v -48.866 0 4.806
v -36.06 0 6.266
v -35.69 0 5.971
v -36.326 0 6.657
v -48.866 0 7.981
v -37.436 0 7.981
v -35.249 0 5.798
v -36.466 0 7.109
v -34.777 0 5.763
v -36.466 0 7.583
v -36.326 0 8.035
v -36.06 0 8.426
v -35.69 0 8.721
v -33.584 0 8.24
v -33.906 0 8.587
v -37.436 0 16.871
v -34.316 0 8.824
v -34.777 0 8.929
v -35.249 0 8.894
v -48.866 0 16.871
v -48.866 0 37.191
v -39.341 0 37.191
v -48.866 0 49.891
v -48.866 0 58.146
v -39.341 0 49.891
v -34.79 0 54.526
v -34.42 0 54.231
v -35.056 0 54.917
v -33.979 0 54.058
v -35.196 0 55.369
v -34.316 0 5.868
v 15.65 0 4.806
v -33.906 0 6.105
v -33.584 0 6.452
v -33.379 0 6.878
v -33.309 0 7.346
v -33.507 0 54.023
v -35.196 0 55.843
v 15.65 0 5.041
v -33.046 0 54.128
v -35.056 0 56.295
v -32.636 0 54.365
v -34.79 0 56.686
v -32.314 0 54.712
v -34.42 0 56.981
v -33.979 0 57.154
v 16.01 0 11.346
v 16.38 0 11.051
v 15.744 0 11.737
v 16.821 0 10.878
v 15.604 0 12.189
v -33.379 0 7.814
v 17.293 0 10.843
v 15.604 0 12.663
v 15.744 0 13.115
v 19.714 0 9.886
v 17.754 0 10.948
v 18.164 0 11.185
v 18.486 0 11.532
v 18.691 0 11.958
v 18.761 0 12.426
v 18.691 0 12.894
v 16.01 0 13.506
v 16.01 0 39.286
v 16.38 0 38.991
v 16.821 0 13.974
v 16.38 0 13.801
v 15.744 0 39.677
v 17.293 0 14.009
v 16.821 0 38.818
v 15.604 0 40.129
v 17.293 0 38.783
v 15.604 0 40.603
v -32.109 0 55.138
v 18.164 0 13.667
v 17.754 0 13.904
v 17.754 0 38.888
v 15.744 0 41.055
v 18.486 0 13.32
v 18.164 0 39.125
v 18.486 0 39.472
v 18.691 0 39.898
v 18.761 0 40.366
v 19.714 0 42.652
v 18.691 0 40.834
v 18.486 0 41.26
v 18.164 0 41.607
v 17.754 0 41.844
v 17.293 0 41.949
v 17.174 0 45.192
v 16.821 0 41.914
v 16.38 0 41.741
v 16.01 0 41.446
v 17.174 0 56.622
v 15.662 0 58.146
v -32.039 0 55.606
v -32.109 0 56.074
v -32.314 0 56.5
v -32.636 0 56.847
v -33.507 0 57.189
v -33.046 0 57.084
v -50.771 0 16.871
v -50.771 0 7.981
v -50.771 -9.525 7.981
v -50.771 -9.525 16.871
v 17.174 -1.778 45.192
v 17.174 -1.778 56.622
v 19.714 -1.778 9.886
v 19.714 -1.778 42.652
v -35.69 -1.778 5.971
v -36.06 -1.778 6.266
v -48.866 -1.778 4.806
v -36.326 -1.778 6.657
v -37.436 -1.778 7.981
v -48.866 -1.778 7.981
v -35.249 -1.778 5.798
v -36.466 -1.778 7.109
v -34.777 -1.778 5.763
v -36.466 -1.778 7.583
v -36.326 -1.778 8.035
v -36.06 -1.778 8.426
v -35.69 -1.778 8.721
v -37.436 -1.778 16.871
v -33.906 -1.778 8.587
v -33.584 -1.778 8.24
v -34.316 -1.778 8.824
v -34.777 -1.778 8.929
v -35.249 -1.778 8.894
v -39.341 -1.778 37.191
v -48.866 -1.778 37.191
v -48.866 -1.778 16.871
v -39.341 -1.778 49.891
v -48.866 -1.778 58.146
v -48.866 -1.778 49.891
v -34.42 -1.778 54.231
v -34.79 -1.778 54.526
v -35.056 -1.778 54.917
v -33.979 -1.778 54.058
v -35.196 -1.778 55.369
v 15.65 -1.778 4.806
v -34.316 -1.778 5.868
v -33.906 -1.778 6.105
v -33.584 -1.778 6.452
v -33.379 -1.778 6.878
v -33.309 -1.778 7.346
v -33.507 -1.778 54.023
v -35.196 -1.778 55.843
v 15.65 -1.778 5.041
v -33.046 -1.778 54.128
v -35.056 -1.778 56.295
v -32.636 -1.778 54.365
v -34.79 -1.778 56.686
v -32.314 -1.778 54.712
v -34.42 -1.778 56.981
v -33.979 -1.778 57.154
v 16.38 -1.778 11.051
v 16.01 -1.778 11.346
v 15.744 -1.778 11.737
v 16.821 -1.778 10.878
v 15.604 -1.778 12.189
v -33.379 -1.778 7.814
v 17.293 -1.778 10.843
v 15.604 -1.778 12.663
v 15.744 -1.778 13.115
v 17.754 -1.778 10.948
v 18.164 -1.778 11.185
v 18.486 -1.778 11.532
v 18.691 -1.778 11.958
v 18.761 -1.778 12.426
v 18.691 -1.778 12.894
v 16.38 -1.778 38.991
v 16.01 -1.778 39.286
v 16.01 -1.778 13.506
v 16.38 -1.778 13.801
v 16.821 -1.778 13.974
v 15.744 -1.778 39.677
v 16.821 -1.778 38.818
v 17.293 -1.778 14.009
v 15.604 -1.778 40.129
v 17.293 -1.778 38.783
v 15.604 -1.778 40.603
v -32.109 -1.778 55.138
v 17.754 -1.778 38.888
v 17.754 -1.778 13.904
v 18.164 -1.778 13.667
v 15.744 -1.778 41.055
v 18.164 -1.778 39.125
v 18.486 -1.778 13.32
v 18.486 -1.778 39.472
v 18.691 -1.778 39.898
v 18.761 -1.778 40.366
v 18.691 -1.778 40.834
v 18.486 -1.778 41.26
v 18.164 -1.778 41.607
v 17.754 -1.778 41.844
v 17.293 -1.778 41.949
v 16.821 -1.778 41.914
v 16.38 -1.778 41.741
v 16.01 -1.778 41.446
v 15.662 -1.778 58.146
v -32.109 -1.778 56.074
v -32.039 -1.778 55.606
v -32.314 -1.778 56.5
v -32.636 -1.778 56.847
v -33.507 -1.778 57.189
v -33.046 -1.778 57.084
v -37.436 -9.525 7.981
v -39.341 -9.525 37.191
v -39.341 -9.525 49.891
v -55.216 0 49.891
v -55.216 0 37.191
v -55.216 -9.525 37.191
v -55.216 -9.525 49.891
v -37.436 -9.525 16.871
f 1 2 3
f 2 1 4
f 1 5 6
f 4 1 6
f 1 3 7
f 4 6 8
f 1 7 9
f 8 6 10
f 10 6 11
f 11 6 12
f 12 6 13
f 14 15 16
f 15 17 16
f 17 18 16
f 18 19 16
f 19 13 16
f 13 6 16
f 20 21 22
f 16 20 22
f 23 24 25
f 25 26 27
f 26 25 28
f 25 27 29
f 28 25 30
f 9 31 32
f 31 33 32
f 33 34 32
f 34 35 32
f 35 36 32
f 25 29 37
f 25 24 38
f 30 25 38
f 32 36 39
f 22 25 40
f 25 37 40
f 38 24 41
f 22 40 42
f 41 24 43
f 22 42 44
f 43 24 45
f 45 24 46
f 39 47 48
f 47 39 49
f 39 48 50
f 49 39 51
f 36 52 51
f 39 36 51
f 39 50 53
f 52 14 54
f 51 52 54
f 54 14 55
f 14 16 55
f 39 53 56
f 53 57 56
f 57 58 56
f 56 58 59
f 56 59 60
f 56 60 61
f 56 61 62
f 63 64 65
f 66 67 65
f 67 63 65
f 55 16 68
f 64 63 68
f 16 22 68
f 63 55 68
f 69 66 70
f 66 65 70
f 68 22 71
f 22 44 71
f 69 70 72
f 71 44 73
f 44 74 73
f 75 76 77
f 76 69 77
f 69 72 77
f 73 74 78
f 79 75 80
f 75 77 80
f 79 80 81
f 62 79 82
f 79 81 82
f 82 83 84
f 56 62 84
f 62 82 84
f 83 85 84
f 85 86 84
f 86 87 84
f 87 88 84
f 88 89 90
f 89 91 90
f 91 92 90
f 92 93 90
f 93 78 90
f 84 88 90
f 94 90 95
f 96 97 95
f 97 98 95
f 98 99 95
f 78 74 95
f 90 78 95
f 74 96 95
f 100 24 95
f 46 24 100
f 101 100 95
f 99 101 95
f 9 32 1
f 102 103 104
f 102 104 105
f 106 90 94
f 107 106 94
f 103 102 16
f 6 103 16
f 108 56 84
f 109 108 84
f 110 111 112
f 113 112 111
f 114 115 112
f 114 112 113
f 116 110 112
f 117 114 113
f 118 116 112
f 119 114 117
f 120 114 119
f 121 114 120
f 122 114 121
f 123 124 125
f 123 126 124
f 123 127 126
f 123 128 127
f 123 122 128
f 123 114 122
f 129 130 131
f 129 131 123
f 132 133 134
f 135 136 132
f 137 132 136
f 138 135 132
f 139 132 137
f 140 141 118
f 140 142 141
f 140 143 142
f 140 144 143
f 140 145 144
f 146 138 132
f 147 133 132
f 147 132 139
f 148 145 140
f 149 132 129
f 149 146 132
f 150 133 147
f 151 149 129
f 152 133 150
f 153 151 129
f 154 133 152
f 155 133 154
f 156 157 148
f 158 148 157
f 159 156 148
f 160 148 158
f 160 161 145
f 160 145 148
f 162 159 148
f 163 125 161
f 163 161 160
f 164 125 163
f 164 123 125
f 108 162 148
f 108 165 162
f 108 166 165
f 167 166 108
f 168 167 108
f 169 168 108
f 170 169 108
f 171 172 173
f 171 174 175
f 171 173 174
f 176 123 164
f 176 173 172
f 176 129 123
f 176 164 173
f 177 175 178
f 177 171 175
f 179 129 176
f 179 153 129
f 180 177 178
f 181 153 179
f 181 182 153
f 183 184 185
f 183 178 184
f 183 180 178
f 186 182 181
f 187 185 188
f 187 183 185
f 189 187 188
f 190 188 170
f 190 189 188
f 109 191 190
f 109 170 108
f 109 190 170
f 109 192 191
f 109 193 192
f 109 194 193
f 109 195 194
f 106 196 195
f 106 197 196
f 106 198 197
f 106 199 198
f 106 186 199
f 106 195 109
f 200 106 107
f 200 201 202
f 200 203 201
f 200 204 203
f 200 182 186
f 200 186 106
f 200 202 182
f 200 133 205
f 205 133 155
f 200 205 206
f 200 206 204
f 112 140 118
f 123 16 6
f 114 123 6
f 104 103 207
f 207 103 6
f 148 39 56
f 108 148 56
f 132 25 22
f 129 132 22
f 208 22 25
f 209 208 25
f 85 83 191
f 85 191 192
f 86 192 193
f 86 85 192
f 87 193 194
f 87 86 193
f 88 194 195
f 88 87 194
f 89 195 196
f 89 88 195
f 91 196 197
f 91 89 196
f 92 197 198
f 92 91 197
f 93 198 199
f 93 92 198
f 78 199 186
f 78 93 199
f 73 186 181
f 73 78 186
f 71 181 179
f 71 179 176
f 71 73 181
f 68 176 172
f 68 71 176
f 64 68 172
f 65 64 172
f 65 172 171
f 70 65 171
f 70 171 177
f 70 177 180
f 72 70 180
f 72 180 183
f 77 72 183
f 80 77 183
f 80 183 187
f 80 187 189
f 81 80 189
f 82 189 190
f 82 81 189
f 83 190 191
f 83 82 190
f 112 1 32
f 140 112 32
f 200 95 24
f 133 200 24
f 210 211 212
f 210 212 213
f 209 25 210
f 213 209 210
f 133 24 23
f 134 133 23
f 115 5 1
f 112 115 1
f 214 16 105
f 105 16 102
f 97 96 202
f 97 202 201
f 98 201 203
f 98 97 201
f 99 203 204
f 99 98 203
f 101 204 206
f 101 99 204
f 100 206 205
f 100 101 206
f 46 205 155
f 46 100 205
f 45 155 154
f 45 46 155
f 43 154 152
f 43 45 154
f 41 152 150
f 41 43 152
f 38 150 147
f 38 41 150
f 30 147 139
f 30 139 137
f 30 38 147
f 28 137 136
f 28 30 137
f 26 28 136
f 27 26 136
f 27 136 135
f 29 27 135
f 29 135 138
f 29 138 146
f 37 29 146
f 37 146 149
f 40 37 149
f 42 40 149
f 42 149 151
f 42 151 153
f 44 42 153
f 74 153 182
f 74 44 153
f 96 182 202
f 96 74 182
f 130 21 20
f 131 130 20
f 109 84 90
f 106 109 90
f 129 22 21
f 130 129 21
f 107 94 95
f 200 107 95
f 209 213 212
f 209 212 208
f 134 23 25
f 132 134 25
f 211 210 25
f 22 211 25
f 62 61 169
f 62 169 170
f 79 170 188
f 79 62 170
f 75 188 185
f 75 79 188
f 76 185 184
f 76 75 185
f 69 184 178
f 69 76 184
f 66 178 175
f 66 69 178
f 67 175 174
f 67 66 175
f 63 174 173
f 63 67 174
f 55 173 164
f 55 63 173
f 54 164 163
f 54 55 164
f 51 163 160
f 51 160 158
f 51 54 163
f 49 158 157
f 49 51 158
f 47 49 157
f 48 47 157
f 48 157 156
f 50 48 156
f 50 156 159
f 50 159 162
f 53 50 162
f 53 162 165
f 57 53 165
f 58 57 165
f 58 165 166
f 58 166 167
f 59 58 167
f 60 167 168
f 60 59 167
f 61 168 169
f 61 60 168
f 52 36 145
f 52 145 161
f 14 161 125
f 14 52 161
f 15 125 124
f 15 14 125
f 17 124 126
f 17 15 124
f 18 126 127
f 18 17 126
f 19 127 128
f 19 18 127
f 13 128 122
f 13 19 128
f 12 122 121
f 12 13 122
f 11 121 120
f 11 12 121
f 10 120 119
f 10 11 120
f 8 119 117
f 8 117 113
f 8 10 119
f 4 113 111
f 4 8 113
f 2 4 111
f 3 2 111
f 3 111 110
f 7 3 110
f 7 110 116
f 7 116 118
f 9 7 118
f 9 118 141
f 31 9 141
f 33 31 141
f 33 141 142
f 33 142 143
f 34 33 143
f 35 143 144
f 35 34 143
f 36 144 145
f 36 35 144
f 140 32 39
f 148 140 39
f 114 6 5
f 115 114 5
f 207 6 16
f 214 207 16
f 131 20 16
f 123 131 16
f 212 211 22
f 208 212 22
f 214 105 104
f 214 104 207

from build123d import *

# Parameters (mm, degrees)
F0_R     = 1.5875
F1_DEPTH = 1.778
F0_W     = 6.35
F0_H     = 12.7
F0_W_2   = 9.525
F2_DEPTH = 9.525
F0_W_3   = 11.43
F0_H_2   = 8.89
F0_W_4   = 1.905


# Not quite as in the source:
# - ends of sketch curves that miss each other by under 0.0002 mm in the source are joined


with BuildPart() as f1:
    # F0 (on Front) → F1 (new body)
    with BuildSketch(Plane.XZ):
        Polygon((15.6624242663, 58.1459343719), (-48.8660596311, 58.1459343719), (-48.8660596311, 49.8909343719), (-39.3410596311, 49.8909343719), (-39.3410596311, 37.1909343719), (-48.8660596311, 37.1909343719), (-48.8660596311, 16.8709343719), (-37.4360596311, 16.8709343719), (-37.4360596311, 7.9809343719), (-48.8660596311, 7.9809343719), (-48.8660596311, 4.8059343719), (15.6499403689, 4.8059343719), (15.6499403689, 5.0407722592), (19.7139403689, 9.8859343719), (19.7139403689, 42.6519343719), (17.1739701182, 45.1919343719), (17.1739701182, 56.6219343719), align=None)
        with Locations((-34.8960596311, 7.3459343719)):
            Circle(F0_R, mode=Mode.SUBTRACT)
        with Locations((17.1739403689, 12.4259343719)):
            Circle(F0_R, mode=Mode.SUBTRACT)
        with Locations((-33.6260596311, 55.6059343719)):
            Circle(F0_R, mode=Mode.SUBTRACT)
        with Locations((17.1739403689, 40.3659343719)):
            Circle(F0_R, mode=Mode.SUBTRACT)
    extrude(amount=F1_DEPTH)


with BuildPart() as f2:
    # F0 (on Front) → F2 (new body)
    with BuildSketch(Plane.XZ):
        with Locations((-52.0410596311, 43.5409343719)):
            Rectangle(F0_W, F0_H)
        with Locations((-44.1035596311, 43.5409343719)):
            Rectangle(F0_W_2, F0_H)
    extrude(amount=F2_DEPTH)


with BuildPart() as f2b:
    # F0 (on Front) → F2, piece 2 (new body)
    with BuildSketch(Plane.XZ):
        with Locations((-43.1510596311, 12.4259343719)):
            Rectangle(F0_W_3, F0_H_2)
        with Locations((-49.8185596311, 12.4259343719)):
            Rectangle(F0_W_4, F0_H_2)
    extrude(amount=F2_DEPTH)


solid = Compound([f1.part, f2.part, f2b.part])
